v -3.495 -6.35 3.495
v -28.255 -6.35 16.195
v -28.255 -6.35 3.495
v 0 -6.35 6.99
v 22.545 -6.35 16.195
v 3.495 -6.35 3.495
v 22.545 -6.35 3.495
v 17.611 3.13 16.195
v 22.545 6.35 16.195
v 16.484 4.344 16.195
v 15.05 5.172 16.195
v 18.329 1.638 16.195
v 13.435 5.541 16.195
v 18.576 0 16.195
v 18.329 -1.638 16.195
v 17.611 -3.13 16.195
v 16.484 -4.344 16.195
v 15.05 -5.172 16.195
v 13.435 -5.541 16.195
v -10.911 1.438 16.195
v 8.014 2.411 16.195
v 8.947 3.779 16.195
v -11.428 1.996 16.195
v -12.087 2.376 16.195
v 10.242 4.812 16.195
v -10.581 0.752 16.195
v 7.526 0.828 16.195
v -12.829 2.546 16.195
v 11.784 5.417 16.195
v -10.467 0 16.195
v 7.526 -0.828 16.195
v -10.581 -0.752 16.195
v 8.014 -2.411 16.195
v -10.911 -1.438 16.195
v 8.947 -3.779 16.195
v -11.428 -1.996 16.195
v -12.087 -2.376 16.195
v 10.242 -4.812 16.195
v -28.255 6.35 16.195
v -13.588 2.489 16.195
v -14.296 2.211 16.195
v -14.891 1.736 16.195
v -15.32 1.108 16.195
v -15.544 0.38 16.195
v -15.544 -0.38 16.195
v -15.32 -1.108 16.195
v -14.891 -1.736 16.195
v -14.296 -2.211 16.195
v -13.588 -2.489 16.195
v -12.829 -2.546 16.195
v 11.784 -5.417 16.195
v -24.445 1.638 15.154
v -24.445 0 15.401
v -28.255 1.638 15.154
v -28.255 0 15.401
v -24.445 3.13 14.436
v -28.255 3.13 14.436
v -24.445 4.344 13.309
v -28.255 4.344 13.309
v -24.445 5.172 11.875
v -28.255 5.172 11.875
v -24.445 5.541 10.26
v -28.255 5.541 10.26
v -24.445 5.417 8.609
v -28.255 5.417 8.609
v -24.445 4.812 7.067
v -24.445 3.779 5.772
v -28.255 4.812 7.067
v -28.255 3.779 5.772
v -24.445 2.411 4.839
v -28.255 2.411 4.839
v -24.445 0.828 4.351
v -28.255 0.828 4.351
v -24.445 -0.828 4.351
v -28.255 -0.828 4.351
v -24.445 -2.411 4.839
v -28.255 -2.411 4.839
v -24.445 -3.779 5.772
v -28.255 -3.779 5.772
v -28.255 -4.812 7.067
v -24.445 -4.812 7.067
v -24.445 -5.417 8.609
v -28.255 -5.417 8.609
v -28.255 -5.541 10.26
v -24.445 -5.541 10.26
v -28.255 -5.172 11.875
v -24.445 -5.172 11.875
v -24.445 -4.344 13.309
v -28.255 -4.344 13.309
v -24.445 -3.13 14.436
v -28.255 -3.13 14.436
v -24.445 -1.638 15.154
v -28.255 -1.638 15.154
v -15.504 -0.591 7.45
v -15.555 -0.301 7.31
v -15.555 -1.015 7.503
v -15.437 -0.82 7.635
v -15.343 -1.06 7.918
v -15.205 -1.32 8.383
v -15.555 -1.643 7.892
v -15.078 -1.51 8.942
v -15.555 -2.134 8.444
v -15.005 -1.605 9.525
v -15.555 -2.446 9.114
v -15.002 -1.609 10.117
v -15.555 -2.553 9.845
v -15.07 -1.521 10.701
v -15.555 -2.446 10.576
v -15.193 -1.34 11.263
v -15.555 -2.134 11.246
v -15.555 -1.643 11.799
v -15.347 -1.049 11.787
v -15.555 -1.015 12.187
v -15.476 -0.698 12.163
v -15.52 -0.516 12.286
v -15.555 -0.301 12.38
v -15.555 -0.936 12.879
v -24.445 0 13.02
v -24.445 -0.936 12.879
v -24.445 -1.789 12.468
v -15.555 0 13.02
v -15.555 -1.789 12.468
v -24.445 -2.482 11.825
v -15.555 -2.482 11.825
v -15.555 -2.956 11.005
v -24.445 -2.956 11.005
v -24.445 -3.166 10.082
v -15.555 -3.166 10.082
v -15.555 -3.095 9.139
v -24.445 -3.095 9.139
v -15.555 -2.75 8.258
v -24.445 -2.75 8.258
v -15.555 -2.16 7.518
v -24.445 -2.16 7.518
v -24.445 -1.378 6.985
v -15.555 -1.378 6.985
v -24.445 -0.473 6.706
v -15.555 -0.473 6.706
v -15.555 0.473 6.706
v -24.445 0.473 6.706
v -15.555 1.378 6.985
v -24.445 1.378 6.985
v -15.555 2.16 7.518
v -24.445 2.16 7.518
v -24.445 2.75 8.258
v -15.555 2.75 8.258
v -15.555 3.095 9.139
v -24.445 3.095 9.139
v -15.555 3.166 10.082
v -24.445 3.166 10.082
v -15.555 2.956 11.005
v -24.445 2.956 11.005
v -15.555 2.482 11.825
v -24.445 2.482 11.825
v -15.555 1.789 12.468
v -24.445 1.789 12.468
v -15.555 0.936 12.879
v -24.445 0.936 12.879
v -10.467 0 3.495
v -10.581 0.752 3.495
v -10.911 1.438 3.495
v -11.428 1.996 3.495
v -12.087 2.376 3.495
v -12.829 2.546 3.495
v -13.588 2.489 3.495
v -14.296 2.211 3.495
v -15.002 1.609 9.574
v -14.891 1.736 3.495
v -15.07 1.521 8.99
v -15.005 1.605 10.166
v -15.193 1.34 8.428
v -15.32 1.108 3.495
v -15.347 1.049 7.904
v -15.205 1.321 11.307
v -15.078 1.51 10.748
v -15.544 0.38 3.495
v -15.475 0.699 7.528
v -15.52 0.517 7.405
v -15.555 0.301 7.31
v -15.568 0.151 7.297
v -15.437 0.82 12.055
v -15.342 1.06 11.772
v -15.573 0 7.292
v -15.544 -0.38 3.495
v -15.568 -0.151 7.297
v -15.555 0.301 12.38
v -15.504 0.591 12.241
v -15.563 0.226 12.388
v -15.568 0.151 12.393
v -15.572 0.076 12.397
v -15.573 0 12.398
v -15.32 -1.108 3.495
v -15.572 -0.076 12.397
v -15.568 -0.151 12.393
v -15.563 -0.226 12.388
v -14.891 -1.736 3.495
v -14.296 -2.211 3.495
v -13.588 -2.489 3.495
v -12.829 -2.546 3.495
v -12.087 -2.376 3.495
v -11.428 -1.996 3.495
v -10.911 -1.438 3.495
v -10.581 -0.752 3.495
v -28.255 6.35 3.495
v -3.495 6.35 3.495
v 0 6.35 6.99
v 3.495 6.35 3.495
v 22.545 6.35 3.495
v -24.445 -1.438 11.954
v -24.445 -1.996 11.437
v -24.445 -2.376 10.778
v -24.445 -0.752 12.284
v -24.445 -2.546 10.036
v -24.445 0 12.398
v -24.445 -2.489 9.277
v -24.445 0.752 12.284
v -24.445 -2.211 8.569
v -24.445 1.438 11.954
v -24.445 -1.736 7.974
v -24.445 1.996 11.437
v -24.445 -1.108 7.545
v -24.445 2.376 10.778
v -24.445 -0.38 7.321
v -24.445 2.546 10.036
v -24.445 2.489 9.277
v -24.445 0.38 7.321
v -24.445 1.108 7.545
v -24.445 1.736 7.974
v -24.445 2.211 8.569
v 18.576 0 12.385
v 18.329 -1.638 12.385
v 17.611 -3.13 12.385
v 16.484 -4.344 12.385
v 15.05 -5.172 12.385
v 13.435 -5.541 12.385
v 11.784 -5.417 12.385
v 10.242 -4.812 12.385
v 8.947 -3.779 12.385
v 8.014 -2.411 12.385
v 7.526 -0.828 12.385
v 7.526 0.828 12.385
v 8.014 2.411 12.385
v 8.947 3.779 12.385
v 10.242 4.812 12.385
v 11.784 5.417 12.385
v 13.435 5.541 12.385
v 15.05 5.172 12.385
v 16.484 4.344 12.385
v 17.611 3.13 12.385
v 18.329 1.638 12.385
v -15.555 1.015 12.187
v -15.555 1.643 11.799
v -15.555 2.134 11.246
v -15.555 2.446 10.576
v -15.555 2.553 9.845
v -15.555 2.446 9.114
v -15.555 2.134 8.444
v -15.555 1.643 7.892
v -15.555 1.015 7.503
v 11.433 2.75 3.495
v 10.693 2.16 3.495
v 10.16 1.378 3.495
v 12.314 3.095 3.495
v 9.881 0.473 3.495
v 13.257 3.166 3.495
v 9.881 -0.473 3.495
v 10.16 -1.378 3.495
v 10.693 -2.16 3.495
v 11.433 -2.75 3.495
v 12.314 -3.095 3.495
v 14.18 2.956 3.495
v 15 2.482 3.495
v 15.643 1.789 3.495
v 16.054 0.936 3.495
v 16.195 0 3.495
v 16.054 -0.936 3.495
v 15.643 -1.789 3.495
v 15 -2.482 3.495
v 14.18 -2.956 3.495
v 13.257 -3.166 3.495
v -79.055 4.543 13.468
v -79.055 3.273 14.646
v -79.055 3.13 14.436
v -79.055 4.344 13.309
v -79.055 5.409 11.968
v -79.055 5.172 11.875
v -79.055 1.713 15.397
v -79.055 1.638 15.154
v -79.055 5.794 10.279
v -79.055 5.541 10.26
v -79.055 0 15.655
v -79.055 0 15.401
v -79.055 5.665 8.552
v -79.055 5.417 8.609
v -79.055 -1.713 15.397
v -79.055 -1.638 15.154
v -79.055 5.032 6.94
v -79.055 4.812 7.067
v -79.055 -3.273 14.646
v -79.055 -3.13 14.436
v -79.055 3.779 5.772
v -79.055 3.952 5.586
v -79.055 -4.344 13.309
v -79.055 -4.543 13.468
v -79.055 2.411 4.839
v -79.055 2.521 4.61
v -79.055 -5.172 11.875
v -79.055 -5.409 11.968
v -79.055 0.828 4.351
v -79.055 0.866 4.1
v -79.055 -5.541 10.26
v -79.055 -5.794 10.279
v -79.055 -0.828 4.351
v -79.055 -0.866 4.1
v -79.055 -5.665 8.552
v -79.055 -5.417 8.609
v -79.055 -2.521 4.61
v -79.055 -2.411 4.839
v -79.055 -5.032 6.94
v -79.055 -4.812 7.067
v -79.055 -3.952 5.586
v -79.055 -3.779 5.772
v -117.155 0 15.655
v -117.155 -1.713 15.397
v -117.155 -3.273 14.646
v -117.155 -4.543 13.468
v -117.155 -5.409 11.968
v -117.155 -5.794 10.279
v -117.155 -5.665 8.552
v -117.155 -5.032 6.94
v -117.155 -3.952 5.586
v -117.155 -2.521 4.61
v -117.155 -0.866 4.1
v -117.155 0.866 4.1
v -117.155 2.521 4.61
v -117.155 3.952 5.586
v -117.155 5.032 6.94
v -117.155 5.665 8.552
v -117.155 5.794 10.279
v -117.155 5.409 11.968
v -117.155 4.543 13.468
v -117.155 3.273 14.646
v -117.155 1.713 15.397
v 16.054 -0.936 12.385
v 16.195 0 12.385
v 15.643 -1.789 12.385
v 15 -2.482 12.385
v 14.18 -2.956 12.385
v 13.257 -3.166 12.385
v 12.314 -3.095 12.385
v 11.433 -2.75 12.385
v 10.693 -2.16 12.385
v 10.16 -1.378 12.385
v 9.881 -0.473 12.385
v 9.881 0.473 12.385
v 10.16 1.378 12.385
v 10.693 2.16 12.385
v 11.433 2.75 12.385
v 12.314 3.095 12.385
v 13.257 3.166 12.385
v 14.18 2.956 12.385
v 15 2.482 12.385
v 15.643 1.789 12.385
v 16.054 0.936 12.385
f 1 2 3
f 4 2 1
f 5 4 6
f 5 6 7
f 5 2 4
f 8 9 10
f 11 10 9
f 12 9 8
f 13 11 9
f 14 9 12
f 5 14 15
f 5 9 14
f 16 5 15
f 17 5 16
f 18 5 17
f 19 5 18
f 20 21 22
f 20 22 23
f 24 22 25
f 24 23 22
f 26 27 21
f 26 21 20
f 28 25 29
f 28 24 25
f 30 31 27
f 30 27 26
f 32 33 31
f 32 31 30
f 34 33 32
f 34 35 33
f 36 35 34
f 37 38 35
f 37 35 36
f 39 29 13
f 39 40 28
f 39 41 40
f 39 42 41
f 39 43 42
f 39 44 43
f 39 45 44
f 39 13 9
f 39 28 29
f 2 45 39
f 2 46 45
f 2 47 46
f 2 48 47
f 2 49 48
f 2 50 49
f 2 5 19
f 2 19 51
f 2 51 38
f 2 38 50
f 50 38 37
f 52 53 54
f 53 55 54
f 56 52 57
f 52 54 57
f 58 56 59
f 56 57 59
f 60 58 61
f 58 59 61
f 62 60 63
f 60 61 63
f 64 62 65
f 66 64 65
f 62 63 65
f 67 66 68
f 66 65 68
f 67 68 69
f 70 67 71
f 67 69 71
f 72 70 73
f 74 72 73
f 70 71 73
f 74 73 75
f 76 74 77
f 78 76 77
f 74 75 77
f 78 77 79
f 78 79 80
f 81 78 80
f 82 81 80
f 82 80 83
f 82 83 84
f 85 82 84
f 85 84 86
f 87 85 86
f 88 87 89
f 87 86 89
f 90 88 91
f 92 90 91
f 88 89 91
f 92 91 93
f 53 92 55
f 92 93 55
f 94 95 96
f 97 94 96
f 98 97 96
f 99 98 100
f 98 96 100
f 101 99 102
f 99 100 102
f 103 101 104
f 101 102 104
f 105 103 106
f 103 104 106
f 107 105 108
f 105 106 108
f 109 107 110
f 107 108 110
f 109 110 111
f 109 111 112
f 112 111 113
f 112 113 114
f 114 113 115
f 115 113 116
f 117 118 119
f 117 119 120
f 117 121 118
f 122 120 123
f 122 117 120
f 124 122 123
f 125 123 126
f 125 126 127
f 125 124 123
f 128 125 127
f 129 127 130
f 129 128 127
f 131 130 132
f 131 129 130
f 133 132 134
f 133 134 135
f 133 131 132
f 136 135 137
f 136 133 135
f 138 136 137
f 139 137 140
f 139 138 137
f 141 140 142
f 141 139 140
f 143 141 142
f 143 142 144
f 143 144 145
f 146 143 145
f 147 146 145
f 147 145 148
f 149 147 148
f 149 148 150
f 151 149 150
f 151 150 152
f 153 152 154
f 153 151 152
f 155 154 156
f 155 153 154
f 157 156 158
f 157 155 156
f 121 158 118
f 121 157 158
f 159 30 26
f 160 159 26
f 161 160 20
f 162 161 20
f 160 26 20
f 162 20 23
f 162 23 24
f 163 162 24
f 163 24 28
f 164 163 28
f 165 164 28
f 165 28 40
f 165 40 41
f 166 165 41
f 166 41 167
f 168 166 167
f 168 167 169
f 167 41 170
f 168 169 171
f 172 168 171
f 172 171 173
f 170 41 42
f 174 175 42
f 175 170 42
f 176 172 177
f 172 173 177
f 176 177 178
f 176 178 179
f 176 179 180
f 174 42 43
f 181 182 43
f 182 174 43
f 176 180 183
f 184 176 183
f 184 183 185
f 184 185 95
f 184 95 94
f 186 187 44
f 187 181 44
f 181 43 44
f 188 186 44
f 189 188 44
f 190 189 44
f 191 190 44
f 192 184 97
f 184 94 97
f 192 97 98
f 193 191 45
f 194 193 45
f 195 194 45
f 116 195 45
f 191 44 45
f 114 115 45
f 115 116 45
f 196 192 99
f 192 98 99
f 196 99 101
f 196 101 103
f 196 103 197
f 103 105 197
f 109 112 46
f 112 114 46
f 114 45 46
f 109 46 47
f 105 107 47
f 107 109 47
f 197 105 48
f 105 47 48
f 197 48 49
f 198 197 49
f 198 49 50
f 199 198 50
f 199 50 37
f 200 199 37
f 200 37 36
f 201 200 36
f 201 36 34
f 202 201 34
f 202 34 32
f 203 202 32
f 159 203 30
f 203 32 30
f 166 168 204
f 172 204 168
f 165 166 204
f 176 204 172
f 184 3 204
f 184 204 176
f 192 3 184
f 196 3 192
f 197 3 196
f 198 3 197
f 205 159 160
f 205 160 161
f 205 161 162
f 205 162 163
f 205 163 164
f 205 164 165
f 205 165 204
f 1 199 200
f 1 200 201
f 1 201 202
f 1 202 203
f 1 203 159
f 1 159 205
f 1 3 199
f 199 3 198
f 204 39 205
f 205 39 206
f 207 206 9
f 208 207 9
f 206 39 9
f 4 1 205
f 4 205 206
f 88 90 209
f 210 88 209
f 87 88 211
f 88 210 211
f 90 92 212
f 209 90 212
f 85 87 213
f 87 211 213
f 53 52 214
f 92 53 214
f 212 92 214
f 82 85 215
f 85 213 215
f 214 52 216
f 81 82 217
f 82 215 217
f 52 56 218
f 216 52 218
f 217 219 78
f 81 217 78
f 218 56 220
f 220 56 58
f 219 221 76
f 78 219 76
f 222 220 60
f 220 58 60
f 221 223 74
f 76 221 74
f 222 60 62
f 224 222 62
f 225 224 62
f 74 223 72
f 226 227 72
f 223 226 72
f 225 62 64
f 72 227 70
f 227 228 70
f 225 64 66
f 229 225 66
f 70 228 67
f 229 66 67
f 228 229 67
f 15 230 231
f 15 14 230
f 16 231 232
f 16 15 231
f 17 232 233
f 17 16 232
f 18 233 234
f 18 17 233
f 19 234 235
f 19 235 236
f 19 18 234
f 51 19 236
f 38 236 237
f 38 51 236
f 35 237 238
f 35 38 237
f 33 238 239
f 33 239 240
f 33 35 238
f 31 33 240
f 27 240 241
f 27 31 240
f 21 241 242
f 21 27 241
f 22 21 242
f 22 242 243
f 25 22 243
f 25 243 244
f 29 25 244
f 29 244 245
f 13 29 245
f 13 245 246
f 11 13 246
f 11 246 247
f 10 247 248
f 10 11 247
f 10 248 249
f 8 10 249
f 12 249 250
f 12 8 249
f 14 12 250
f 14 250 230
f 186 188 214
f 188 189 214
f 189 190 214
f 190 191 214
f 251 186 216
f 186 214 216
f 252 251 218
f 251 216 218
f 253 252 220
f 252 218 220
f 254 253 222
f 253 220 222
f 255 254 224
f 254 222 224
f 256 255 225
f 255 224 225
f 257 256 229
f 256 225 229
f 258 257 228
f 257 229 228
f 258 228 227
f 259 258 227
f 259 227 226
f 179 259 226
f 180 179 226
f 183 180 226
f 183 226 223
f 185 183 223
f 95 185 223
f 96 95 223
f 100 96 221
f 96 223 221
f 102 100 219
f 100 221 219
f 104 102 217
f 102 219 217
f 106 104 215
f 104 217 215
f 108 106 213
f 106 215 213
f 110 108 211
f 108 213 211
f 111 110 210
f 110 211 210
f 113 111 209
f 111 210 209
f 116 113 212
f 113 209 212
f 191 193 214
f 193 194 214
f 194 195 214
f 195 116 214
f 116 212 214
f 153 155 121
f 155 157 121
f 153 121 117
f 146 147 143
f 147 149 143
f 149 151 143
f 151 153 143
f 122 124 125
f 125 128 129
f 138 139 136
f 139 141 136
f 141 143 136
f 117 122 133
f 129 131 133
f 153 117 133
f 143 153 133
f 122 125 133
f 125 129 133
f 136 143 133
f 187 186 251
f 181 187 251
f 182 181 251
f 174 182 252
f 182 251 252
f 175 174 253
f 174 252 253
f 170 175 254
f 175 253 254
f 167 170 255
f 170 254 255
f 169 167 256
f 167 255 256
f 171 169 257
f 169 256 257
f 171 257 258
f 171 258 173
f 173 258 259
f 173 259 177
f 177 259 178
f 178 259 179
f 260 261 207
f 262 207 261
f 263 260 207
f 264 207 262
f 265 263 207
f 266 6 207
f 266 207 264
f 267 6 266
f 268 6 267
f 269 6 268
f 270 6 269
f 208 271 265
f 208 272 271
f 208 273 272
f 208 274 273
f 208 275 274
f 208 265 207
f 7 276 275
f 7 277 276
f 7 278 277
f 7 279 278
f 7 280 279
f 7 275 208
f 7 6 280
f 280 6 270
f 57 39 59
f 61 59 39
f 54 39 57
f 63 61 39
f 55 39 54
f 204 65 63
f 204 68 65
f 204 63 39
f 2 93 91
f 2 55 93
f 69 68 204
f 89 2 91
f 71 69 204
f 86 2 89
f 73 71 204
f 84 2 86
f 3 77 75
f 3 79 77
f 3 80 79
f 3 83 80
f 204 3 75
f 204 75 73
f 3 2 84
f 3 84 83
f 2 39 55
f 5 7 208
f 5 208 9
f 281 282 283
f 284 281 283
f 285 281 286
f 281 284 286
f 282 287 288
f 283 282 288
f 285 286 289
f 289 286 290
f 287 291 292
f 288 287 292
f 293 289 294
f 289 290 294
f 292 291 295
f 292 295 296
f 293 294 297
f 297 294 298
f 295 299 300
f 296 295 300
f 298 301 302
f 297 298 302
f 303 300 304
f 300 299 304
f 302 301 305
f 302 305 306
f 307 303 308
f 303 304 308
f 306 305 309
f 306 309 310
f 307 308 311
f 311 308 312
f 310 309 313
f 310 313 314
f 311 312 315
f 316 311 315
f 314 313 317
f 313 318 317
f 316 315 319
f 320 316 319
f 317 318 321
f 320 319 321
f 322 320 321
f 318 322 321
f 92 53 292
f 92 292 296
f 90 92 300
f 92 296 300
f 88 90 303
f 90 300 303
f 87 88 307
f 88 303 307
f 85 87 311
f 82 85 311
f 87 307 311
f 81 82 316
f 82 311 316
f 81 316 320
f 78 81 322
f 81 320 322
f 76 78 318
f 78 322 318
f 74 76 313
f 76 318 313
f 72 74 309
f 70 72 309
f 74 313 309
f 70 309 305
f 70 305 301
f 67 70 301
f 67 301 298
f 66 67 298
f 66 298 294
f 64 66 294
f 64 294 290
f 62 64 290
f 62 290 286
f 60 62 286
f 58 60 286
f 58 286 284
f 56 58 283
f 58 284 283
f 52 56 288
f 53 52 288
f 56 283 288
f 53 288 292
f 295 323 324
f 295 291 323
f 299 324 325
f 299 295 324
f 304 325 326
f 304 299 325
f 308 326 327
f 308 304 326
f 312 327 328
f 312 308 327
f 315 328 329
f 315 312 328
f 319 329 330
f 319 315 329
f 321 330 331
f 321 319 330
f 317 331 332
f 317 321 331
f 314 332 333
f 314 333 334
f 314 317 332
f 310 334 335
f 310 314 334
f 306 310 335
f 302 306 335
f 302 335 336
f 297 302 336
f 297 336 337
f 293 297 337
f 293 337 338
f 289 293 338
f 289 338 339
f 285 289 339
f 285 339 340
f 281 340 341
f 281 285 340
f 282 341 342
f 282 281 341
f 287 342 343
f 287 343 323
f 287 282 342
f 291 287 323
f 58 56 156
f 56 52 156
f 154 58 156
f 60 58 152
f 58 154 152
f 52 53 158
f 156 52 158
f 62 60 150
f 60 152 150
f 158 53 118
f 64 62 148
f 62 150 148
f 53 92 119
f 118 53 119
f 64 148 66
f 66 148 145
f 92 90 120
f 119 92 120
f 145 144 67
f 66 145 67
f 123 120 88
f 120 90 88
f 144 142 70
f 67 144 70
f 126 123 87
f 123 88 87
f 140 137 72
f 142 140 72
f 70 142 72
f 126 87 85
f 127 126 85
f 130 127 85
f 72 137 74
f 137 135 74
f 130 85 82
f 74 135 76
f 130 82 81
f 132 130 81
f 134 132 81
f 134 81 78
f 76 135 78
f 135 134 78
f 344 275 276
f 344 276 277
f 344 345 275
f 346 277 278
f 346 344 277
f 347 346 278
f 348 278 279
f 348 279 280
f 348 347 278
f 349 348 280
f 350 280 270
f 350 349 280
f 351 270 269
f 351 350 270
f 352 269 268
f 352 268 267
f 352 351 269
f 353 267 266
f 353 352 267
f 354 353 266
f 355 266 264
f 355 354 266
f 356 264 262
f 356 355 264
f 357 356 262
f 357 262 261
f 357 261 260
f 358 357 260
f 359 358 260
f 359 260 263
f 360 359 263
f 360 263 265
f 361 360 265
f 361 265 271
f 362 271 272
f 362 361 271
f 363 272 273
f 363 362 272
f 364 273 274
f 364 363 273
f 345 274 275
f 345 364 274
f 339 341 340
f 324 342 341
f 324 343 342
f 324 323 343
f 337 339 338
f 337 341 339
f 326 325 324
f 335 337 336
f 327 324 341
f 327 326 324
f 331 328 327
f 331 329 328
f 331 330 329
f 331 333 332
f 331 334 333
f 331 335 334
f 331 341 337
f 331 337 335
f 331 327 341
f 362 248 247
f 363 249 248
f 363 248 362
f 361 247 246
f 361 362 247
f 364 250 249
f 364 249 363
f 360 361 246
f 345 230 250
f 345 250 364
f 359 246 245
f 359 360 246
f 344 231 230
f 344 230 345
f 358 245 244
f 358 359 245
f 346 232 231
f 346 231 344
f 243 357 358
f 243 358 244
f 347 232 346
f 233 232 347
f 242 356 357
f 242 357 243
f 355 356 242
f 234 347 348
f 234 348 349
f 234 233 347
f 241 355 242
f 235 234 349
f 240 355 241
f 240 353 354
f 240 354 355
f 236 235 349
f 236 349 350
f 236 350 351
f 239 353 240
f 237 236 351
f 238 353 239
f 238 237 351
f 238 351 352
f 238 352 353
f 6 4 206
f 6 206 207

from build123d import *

# Parameters (mm, degrees)
F1_DEPTH = 6.35
F2_R     = 2.5527
F5_DEPTH = 12.701
F8_W     = 8.89
F8_H     = 3.175
F10_W    = 38.1
F10_H    = 0.254


with BuildPart() as f1:
    # F0 (on Front) → F1 (new body, symmetric)
    with BuildSketch(Plane.XZ):
        Polygon((-28.25492, 3.49508), (-3.49508, 3.49508), (0, 6.990161), (3.49508, 3.49508), (22.54508, 3.49508), (22.54508, 16.19508), (-28.25492, 16.19508), align=None)
    extrude(amount=F1_DEPTH, both=True)

    # F3 (on Front) → F4 (revolve, cut)
    with BuildSketch(Plane.XZ):
        Polygon((18.57633, 16.19508), (13.02008, 16.19508), (13.02008, 3.49508), (16.19508, 3.49508), (16.19508, 12.38508), (18.57633, 12.38508), align=None)
    revolve(axis=Axis((13.02008, 0, 9.84508), (0, 0, -1)), mode=Mode.SUBTRACT)

    # F2 (on face) → F5 (cut, through all)
    with BuildSketch(Plane.XY.offset(16.19508)):
        with Locations((-13.02008, 0)):
            Circle(F2_R)
    extrude(amount=-F5_DEPTH, mode=Mode.SUBTRACT)

    # F6 (on Front) → F7 (revolve, cut)
    with BuildSketch(Plane.XZ):
        Polygon((-15.55492, 12.39778), (-24.44492, 12.39778), (-24.44492, 15.40133), (-28.25492, 15.40133), (-28.25492, 9.84508), (-14.021103, 9.84508), align=None)
    revolve(axis=Axis((-21.138011, 0, 9.84508), (-1, 0, 0)), mode=Mode.SUBTRACT)


with BuildPart() as f9:
    # F8 (on Front) → F9 (revolve)
    with BuildSketch(Plane.XZ):
        with Locations((-19.99992, 11.43258)):
            Rectangle(F8_W, F8_H)
        Polygon((-117.15492, 9.84508), (-24.44492, 9.84508), (-24.44492, 13.02008), (-24.44492, 15.40133), (-117.15492, 15.40133), align=None)
    revolve(axis=Axis((-66.35492, 0, 9.84508), (1, 0, 0)))

    # F10 (on Front) → F11 (revolve)
    with BuildSketch(Plane.XZ):
        with Locations((-98.10492, 15.52833)):
            Rectangle(F10_W, F10_H)
    revolve(axis=Axis((-72.70492, 0, 9.84508), (1, 0, 0)))


solid = Compound([f1.part, f9.part])
